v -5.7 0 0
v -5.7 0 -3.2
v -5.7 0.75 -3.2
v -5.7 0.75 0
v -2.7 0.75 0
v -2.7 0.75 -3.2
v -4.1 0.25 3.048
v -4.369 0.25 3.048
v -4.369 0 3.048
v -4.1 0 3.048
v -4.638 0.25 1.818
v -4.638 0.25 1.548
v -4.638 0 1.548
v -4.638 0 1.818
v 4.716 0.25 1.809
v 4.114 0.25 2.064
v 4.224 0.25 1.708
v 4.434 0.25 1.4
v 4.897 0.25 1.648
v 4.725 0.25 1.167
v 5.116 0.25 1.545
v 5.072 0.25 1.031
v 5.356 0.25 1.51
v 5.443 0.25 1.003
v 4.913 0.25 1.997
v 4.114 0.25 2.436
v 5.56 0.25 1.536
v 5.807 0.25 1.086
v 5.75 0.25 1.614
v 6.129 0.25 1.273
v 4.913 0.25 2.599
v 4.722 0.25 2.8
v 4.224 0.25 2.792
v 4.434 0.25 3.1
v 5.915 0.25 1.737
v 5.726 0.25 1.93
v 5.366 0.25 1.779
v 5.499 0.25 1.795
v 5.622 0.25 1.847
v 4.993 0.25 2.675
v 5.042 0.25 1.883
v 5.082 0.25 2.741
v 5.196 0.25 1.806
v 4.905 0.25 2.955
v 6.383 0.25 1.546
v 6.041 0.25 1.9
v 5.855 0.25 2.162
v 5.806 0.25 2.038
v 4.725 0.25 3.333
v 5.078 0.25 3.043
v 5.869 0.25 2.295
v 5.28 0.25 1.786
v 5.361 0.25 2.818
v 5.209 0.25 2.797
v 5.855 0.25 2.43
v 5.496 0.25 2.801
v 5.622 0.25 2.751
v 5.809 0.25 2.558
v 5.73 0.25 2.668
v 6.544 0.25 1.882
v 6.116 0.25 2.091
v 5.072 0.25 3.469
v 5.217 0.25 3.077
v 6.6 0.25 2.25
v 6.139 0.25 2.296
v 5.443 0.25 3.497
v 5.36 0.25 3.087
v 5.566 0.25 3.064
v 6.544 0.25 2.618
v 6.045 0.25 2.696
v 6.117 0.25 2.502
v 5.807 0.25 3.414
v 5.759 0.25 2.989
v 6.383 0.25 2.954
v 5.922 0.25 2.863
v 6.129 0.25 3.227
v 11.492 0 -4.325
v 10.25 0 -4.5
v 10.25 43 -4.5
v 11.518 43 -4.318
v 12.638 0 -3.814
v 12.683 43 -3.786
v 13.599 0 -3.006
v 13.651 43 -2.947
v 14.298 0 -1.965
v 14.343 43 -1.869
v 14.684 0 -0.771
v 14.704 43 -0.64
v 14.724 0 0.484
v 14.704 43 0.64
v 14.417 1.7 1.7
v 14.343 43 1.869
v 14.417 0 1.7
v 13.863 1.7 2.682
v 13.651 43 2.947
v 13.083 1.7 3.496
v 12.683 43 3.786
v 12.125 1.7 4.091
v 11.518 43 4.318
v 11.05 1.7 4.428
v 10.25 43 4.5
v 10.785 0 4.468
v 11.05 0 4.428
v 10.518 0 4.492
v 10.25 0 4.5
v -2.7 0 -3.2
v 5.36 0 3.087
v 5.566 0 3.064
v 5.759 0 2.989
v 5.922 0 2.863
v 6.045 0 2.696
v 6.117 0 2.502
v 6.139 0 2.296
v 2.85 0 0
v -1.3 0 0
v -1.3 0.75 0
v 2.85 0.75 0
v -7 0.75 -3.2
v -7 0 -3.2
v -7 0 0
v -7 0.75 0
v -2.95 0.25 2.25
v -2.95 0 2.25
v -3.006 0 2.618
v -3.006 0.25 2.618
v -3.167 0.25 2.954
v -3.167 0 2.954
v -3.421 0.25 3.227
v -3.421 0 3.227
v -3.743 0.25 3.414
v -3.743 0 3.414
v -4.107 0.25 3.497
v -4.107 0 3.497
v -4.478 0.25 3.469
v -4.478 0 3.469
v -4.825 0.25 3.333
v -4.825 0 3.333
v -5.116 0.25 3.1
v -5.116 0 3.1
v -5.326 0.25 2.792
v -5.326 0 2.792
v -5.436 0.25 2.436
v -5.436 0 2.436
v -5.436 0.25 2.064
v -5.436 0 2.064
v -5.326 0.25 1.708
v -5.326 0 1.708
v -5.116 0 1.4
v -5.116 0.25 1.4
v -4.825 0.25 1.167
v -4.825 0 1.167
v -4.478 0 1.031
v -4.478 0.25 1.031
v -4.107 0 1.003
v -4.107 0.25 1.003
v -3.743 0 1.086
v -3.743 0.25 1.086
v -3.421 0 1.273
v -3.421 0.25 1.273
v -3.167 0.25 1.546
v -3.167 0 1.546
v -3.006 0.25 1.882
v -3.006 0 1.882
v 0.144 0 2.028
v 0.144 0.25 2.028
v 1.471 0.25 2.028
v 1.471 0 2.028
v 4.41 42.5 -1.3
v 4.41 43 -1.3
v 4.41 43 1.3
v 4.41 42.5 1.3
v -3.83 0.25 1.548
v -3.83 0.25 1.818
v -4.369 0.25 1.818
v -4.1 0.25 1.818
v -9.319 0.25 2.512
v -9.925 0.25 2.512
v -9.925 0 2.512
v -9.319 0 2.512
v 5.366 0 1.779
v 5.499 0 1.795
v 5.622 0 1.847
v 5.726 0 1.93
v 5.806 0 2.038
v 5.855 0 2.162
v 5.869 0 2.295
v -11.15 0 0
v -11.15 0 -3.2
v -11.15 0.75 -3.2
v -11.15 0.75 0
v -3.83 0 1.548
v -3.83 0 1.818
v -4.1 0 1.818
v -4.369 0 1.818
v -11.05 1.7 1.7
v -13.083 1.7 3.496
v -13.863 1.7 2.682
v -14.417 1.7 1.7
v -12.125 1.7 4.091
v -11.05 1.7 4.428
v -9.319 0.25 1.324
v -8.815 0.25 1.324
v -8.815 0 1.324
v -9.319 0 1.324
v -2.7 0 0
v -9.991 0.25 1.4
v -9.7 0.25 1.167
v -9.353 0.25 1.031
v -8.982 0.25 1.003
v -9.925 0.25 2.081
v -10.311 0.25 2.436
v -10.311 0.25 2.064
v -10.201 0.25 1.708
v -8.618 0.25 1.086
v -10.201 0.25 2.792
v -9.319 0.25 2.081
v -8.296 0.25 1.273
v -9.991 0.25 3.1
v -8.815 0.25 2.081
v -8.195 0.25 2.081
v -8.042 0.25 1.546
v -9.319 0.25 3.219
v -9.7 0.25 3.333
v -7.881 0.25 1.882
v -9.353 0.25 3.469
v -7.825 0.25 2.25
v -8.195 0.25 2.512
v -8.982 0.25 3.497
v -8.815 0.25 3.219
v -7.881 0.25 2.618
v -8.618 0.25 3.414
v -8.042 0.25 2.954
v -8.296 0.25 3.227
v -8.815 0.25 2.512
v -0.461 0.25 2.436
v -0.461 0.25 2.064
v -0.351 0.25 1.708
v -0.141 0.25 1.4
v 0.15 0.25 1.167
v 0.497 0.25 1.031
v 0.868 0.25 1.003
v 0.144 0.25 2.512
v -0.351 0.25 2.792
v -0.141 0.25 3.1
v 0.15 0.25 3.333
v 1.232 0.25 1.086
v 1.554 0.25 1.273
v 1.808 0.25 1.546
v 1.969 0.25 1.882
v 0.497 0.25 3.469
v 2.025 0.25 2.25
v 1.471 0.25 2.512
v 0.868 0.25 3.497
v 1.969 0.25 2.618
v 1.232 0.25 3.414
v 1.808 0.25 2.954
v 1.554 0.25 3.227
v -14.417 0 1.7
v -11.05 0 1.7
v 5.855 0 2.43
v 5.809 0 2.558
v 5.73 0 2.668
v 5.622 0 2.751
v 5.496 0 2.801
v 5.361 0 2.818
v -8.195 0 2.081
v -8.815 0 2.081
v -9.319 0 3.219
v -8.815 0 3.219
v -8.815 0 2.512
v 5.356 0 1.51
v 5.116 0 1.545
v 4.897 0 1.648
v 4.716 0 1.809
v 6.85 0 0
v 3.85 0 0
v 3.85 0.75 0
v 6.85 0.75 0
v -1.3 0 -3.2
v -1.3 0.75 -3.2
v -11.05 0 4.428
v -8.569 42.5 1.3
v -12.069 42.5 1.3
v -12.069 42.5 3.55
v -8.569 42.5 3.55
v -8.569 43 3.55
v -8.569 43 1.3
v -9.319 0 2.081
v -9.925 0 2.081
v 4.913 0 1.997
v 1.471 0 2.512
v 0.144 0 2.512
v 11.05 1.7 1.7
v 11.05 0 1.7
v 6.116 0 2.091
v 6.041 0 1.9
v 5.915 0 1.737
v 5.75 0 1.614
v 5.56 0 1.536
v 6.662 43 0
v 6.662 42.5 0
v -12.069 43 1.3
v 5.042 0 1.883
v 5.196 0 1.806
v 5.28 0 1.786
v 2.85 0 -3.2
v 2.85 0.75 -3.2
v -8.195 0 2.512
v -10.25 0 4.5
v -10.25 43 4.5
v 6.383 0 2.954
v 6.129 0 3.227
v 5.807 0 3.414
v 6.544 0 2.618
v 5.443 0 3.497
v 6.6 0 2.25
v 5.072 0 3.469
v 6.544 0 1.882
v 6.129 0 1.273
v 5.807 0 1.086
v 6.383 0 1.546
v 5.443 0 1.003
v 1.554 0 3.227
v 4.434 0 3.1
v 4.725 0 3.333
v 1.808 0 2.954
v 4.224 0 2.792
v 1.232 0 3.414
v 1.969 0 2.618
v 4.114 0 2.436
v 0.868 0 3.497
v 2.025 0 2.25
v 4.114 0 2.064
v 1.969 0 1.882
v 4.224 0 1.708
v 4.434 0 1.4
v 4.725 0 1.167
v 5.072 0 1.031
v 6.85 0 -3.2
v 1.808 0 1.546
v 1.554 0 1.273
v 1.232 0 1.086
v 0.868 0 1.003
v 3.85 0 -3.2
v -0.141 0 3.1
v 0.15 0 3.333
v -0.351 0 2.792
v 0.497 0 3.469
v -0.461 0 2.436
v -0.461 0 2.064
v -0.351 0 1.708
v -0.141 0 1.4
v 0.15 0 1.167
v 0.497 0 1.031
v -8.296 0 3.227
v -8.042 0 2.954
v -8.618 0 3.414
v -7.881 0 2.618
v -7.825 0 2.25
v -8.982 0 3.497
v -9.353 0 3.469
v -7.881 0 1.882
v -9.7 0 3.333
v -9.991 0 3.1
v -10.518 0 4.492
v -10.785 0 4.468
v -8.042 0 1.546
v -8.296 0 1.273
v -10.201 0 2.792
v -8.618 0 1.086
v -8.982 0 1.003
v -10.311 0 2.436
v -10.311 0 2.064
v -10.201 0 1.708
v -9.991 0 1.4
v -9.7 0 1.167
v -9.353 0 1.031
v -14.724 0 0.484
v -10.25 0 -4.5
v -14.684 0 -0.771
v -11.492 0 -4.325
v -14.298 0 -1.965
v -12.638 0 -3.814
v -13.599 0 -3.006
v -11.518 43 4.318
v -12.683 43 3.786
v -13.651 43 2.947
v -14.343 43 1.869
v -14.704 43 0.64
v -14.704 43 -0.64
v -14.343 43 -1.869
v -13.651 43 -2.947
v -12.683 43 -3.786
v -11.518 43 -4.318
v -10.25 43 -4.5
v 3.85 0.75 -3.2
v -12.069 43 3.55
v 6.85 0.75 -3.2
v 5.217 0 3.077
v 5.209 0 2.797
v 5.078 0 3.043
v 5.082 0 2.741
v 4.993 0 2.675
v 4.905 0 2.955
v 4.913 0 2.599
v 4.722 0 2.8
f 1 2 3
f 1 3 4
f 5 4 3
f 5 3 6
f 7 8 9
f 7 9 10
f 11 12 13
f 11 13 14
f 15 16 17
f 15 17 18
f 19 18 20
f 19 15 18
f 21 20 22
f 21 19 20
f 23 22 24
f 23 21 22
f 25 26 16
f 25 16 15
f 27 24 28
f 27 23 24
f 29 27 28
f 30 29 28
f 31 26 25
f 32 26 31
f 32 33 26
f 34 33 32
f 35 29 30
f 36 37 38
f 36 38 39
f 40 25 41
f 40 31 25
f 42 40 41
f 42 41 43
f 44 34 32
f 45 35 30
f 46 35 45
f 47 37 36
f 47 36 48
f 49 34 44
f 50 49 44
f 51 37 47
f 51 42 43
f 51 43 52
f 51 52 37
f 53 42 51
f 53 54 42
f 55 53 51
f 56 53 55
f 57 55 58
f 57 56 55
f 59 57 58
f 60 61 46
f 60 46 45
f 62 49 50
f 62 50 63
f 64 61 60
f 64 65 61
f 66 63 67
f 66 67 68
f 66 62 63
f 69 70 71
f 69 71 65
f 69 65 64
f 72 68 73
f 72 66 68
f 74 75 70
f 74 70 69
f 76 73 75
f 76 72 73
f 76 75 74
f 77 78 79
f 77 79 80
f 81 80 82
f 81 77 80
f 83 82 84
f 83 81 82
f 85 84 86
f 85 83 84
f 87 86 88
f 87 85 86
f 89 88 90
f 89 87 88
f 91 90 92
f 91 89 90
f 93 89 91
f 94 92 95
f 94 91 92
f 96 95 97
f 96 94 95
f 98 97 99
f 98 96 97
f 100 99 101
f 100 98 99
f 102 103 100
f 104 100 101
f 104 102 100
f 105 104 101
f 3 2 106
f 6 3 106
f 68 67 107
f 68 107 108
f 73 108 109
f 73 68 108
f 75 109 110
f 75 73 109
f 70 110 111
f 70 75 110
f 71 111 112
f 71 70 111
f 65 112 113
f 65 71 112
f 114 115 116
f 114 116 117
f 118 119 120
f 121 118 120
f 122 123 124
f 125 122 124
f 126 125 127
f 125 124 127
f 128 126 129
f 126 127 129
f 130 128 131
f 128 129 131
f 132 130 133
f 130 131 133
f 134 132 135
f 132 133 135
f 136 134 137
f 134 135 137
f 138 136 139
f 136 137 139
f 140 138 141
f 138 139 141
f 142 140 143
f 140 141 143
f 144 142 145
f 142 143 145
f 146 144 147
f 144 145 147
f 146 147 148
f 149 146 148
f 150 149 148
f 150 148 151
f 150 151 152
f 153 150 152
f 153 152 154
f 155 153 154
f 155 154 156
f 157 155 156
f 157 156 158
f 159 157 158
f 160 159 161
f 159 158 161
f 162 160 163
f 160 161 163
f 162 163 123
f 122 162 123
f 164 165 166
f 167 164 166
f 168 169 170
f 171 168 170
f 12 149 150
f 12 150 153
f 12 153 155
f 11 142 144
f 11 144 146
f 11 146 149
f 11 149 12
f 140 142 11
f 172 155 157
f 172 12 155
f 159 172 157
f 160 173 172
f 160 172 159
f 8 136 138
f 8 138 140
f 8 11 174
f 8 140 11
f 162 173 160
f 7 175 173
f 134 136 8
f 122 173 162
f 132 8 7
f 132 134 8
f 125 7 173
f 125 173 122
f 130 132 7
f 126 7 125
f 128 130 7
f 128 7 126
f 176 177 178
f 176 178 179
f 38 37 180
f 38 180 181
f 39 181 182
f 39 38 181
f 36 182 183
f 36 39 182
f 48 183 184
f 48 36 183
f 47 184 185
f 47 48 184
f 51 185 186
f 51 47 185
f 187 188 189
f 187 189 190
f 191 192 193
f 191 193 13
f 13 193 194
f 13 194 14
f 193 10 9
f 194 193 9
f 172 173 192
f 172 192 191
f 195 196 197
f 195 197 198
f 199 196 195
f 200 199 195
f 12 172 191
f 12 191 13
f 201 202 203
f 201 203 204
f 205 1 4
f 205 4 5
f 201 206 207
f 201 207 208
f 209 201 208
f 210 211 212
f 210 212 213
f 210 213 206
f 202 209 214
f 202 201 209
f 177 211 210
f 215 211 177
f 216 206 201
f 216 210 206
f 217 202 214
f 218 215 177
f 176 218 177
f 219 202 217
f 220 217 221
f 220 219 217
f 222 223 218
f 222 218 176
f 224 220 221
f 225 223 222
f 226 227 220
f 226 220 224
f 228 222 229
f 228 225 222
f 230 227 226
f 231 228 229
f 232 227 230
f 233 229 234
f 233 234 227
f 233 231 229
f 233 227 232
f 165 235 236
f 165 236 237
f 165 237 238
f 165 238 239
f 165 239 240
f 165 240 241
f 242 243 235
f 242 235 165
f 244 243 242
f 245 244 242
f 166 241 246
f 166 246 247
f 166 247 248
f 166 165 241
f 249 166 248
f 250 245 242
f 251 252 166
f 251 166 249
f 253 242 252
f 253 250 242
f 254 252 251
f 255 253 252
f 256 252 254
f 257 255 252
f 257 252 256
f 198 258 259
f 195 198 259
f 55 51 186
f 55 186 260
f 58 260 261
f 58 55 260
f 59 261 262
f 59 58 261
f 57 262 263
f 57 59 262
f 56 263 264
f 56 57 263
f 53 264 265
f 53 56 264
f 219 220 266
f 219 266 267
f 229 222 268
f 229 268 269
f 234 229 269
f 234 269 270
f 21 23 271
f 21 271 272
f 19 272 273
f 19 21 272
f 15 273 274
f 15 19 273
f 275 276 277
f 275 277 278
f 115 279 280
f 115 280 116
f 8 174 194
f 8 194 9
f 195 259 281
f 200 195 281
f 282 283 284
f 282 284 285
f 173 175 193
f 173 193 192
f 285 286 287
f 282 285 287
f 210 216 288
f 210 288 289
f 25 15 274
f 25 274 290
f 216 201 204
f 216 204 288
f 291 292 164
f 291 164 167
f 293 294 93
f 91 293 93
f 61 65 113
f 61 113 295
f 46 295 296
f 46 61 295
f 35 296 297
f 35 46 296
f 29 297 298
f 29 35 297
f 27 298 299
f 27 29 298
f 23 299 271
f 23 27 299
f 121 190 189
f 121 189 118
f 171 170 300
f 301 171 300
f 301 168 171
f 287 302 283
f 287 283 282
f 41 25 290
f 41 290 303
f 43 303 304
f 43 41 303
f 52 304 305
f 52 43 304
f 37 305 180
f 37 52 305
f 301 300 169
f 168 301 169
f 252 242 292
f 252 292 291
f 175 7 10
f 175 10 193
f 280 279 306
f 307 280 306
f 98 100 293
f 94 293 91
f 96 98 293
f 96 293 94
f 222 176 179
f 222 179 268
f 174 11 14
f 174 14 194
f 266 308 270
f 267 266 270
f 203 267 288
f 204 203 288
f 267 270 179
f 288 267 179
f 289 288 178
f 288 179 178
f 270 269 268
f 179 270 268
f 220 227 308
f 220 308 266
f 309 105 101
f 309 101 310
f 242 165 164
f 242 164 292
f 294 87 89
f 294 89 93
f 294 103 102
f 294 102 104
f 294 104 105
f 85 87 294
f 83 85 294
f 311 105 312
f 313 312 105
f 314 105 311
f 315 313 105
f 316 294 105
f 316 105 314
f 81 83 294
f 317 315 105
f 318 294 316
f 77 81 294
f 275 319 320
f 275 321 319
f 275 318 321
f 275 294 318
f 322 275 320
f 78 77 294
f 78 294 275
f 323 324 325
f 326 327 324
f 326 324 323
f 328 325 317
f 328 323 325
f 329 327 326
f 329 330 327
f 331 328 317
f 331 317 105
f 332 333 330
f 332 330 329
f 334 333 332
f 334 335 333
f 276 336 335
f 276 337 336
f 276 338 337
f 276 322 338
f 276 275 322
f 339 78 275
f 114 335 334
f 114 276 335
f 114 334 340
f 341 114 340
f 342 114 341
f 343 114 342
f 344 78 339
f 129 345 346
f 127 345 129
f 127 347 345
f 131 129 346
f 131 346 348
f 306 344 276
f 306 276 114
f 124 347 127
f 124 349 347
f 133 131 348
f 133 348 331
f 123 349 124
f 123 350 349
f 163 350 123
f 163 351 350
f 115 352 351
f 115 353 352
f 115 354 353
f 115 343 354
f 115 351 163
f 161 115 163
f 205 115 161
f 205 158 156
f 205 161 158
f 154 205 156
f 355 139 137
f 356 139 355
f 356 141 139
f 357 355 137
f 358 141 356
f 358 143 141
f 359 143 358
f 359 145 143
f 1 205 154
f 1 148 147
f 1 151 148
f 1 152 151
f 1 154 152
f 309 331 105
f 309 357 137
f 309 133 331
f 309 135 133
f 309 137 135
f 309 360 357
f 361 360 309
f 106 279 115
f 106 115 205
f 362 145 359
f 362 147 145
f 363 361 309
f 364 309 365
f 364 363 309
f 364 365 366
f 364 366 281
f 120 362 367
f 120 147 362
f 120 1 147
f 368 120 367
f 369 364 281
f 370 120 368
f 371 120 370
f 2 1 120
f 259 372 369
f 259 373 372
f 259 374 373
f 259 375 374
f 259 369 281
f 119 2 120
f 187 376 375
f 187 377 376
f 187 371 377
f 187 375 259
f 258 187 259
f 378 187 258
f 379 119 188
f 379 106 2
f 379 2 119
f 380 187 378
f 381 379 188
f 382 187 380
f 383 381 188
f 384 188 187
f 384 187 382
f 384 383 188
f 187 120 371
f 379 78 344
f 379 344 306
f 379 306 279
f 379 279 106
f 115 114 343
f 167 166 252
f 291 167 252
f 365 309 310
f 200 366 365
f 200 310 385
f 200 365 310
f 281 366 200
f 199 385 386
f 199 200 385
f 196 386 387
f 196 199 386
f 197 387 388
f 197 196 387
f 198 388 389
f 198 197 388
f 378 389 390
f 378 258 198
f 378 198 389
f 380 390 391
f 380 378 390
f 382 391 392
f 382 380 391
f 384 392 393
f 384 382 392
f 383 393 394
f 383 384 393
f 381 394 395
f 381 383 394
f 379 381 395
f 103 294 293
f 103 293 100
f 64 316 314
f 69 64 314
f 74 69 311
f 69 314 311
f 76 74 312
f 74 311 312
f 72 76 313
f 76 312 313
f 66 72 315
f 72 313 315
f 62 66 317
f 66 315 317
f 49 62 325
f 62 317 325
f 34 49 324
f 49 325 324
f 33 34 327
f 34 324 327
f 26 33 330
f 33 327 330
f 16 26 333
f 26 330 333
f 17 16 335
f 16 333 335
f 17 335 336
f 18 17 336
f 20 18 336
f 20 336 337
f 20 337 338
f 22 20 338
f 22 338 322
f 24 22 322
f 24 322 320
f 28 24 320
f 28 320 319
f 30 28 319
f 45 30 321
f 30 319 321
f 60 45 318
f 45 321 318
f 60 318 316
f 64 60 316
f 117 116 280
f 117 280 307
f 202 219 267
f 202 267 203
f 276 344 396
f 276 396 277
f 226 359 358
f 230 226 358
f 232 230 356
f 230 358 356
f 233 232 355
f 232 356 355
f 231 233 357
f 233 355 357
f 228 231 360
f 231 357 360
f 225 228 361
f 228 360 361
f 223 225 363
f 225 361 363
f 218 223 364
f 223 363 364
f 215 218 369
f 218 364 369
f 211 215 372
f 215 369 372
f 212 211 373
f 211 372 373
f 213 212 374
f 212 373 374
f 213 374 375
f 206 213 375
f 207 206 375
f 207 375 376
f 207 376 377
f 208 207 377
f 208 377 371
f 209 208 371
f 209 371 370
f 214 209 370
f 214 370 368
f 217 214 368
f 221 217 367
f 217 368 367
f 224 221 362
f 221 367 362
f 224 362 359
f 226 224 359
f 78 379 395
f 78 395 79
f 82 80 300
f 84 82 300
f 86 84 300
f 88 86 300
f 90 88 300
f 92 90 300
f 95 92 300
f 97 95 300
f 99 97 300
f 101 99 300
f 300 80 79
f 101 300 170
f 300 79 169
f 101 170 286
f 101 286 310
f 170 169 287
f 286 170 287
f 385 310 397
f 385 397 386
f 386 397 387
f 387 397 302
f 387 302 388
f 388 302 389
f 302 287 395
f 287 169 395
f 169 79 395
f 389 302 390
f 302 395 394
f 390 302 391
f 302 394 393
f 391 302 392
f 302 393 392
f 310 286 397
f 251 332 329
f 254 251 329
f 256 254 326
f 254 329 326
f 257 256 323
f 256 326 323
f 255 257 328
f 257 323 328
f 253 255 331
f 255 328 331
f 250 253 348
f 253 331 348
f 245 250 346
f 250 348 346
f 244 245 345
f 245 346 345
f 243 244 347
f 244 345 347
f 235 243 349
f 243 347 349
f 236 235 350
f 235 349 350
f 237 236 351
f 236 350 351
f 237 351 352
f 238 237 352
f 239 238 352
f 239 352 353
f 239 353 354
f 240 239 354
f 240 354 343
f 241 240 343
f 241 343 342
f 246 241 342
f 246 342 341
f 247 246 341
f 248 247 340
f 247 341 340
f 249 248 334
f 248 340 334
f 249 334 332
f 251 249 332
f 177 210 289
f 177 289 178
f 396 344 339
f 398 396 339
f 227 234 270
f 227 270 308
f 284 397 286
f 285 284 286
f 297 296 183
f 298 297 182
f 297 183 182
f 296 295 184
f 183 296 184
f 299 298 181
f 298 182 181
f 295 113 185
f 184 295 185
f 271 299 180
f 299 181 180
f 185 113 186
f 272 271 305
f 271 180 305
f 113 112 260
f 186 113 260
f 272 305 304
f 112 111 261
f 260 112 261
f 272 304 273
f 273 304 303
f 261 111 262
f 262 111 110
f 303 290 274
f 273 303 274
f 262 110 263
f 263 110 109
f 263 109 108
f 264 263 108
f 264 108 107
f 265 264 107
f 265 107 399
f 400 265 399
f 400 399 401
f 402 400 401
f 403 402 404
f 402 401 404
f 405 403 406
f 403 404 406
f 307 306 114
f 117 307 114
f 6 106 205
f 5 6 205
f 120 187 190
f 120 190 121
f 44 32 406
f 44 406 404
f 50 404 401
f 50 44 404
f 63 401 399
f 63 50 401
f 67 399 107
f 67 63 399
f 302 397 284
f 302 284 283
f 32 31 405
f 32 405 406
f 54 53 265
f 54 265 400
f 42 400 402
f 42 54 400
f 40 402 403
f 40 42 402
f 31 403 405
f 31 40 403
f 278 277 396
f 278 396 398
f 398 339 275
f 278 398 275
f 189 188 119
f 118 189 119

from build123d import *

# Parameters (mm, degrees)
BOSS_EXTRUDE1_DEPTH = 43
SKETCH2_W           = 3.5
SKETCH2_H           = 2.25
CUT_EXTRUDE1_DEPTH  = 0.5
SKETCH3_W           = 4.15
SKETCH3_H           = 3.2
SKETCH3_W_2         = 3
CUT_EXTRUDE2_DEPTH  = 0.75
SKETCH5_R           = 1.25
CUT_EXTRUDE3_DEPTH  = 0.25
SKETCH6_W           = 1.326960347
SKETCH6_H           = 0.484850896
BOSS_EXTRUDE2_DEPTH = 0.25
SKETCH7_W           = 3.7
SKETCH7_H           = 2.8
CUT_EXTRUDE4_DEPTH  = 1.7


with BuildPart() as part:
    # Sketch1 → Boss-Extrude1 (new body)
    with BuildSketch(Plane(origin=(0, 0, 0), x_dir=(1, 0, 0), z_dir=(0, 1, 0))):
        with BuildLine():
            Line((-10.25, 4.5), (10.25, 4.5))
            ThreePointArc((10.25, 4.5), (14.75, 0), (10.25, -4.5))
            Line((10.25, -4.5), (-10.25, -4.5))
            ThreePointArc((-10.25, -4.5), (-14.75, 0), (-10.25, 4.5))
        make_face()
    extrude(amount=BOSS_EXTRUDE1_DEPTH)

    # Sketch2 → Cut-Extrude1 (cut)
    with BuildSketch(Plane(origin=(0, 43, 0), x_dir=(1, 0, 0), z_dir=(0, 1, 0))):
        with Locations((-10.319273123, -2.424555182)):
            Rectangle(SKETCH2_W, SKETCH2_H)
        Polygon((6.661858634, 0), (4.410192585, 1.3), (4.410192585, -1.3), align=None)
    extrude(amount=-CUT_EXTRUDE1_DEPTH, mode=Mode.SUBTRACT)

    # Sketch3 → Cut-Extrude2 (cut)
    with BuildSketch(Plane.XZ):
        with Locations((-9.075, -1.6)):
            Rectangle(SKETCH3_W, SKETCH3_H)
        with Locations((-4.2, -1.6)):
            Rectangle(SKETCH3_W_2, SKETCH3_H)
        with Locations((0.775, -1.6)):
            Rectangle(SKETCH3_W, SKETCH3_H)
        with Locations((5.35, -1.6)):
            Rectangle(SKETCH3_W_2, SKETCH3_H)
    extrude(amount=-CUT_EXTRUDE2_DEPTH, mode=Mode.SUBTRACT)

    # Sketch5 → Cut-Extrude3 (cut)
    with BuildSketch(Plane.XZ):
        with Locations((-9.075, 2.25)):
            Circle(SKETCH5_R)
        with Locations((-4.2, 2.25)):
            Circle(SKETCH5_R)
        with Locations((0.775, 2.25)):
            Circle(SKETCH5_R)
        with Locations((5.35, 2.25)):
            Circle(SKETCH5_R)
    extrude(amount=-CUT_EXTRUDE3_DEPTH, mode=Mode.SUBTRACT)

    # Sketch6 → Boss-Extrude2 (add)
    with BuildSketch(Plane.XZ.offset(-0.25)):
        Polygon((-9.319136071, 2.080501294), (-9.924638911, 2.080501294), (-9.924638911, 2.512434892), (-9.319136071, 2.512434892), (-9.319136071, 3.219423302), (-8.814550371, 3.219423302), (-8.814550371, 2.512434892), (-8.194630797, 2.512434892), (-8.194630797, 2.080501294), (-8.814550371, 2.080501294), (-8.814550371, 1.323622745), (-9.319136071, 1.323622745), align=None)
        with Locations((0.807600037, 2.270009444)):
            Rectangle(SKETCH6_W, SKETCH6_H)
        with BuildLine():
            Line((4.715564351, 1.80853907), (4.912980216, 1.997240994))
            add(Edge.make_bspline(
                [(4.912980216, 1.997240994), (4.929707146, 1.979899926), (4.962433267, 1.945972249), (5.015418116, 1.901557226), (5.069888716, 1.863810031), (5.125997527, 1.833043383), (5.183712319, 1.808626724), (5.243133504, 1.791593673), (5.30411755, 1.780868656), (5.345327837, 1.77968748), (5.366105216, 1.779091955)],
                knots=[0, 0, 0, 0, 7.224e-05, 0.000141338, 0.000207016, 0.000270758, 0.000332981, 0.000394603, 0.000455858, 0.000518145, 0.000518145, 0.000518145, 0.000518145], degree=3))
            add(Edge.make_bspline(
                [(5.366105216, 1.779091955), (5.383454547, 1.779571665), (5.417691539, 1.78051832), (5.467955666, 1.787474955), (5.516054131, 1.799260394), (5.562025094, 1.815642069), (5.60609584, 1.836272091), (5.647855993, 1.862202541), (5.687529977, 1.892567959), (5.724654232, 1.927315209), (5.758169405, 1.965560051), (5.788367052, 2.005838724), (5.813379552, 2.048863663), (5.833797229, 2.09400743), (5.849886827, 2.141286329), (5.86130626, 2.190697991), (5.867922688, 2.24235398), (5.868909154, 2.277470612), (5.869410505, 2.295317917)],
                knots=[0, 0, 0, 0, 5.2039e-05, 0.000102693, 0.000151885, 0.000200355, 0.000248878, 0.000297579, 0.000347521, 0.000398543, 0.000449848, 0.000499909, 0.000549331, 0.000598819, 0.000648325, 0.000698909, 0.000750715, 0.000804255, 0.000804255, 0.000804255, 0.000804255], degree=3))
            add(Edge.make_bspline(
                [(5.869410505, 2.295317917), (5.869263959, 2.307844037), (5.868975113, 2.332533276), (5.86589296, 2.368961679), (5.860774249, 2.404382271), (5.853594852, 2.438690106), (5.844556603, 2.472033181), (5.833494646, 2.504194313), (5.820119677, 2.535214768), (5.805150865, 2.565257037), (5.788442474, 2.594066561), (5.769713133, 2.621261294), (5.74917272, 2.646629922), (5.727643129, 2.671055186), (5.703698503, 2.693107682), (5.678410927, 2.714002754), (5.651417573, 2.733222757), (5.622751223, 2.750500219), (5.593267533, 2.766602513), (5.562362337, 2.779937286), (5.530899248, 2.791924454), (5.498326297, 2.800942411), (5.465217256, 2.808786127), (5.431111276, 2.813576528), (5.396332037, 2.8172166), (5.372826074, 2.817440712), (5.360997043, 2.817553494)],
                knots=[0, 0, 0, 0, 3.7571e-05, 7.4053e-05, 0.000109578, 0.000144878, 0.000179138, 0.000213158, 0.000246813, 0.000280408, 0.000313803, 0.000346642, 0.00037935, 0.000411691, 0.000444216, 0.00047688, 0.000510064, 0.000543509, 0.000577252, 0.000610751, 0.000644407, 0.00067817, 0.000712066, 0.000746402, 0.000781414, 0.000816882, 0.000816882, 0.000816882, 0.000816882], degree=3))
            add(Edge.make_bspline(
                [(5.360997043, 2.817553494), (5.340932624, 2.81697445), (5.301511258, 2.81583678), (5.24366326, 2.806901525), (5.188381183, 2.792269684), (5.144297695, 2.774670447), (5.109804461, 2.757561474), (5.083558758, 2.7419627), (5.056533291, 2.724293685), (5.028913098, 2.70406497), (5.000548666, 2.681517285), (4.971927273, 2.656179356), (4.94232014, 2.628879026), (4.922924645, 2.609394521), (4.912980216, 2.599404455)],
                knots=[0, 0, 0, 0, 6.0171e-05, 0.000118221, 0.000175146, 0.00023139, 0.000260282, 0.000290584, 0.000322921, 0.000357119, 0.000393253, 0.000431582, 0.000471767, 0.00051405, 0.00051405, 0.00051405, 0.00051405], degree=3))
            Line((4.912980216, 2.599404455), (4.721573966, 2.80042609))
            add(Edge.make_bspline(
                [(4.721573966, 2.80042609), (4.735028795, 2.813416305), (4.761289744, 2.838770428), (4.800903659, 2.874770908), (4.840467708, 2.907121373), (4.879026152, 2.936995856), (4.917210456, 2.963524548), (4.955017137, 2.98673217), (4.992016231, 3.00721189), (5.028982989, 3.024596757), (5.066210855, 3.039452525), (5.104498273, 3.051981146), (5.143863537, 3.062917773), (5.184632673, 3.071524335), (5.226623771, 3.078530672), (5.269971765, 3.083160305), (5.314474118, 3.086370664), (5.344564827, 3.086645271), (5.35979512, 3.086784263)],
                knots=[0, 0, 0, 0, 5.6107e-05, 0.000109509, 0.000160524, 0.000209386, 0.000255813, 0.000299927, 0.000342421, 0.000382612, 0.000422396, 0.000462589, 0.000503412, 0.000544902, 0.000587533, 0.000631069, 0.000675641, 0.000721323, 0.000721323, 0.000721323, 0.000721323], degree=3))
            add(Edge.make_bspline(
                [(5.35979512, 3.086784263), (5.387770205, 3.086069862), (5.44250967, 3.084671977), (5.522736662, 3.074350257), (5.599013379, 3.056931828), (5.671476881, 3.03263203), (5.739905397, 3.001078873), (5.804513521, 2.962792741), (5.865193661, 2.917410259), (5.921423669, 2.865607584), (5.972270451, 2.808383842), (6.017263923, 2.746964786), (6.05431883, 2.680909351), (6.085758013, 2.611632486), (6.109316906, 2.538051127), (6.126465703, 2.460830166), (6.136900657, 2.379638221), (6.138053378, 2.324195186), (6.138641274, 2.295918878)],
                knots=[0, 0, 0, 0, 8.3912e-05, 0.000164192, 0.000242185, 0.000318297, 0.000393051, 0.000467825, 0.000543186, 0.000619954, 0.000696787, 0.000772517, 0.000847877, 0.000923602, 0.00100038, 0.001079187, 0.001160659, 0.001245459, 0.001245459, 0.001245459, 0.001245459], degree=3))
            add(Edge.make_bspline(
                [(6.138641274, 2.295918878), (6.138384513, 2.277478096), (6.137875675, 2.240932973), (6.132859378, 2.186959442), (6.12516416, 2.134563275), (6.114212057, 2.083808916), (6.100594572, 2.034520629), (6.083261482, 1.986921578), (6.063185313, 1.940751187), (6.039746603, 1.896439727), (6.013473059, 1.853931201), (5.984748971, 1.813333056), (5.953021206, 1.775049105), (5.918591266, 1.738911903), (5.881745297, 1.704687885), (5.842122948, 1.672619943), (5.799686332, 1.642914873), (5.754868318, 1.615548264), (5.708522141, 1.590415811), (5.660614863, 1.569342312), (5.612080106, 1.550739522), (5.56258902, 1.535713643), (5.512032672, 1.524379585), (5.460797123, 1.51582654), (5.408463744, 1.51103959), (5.373325792, 1.51025649), (5.355588389, 1.509861186)],
                knots=[0, 0, 0, 0, 5.5309e-05, 0.000109609, 0.000162473, 0.0002141, 0.00026528, 0.000315751, 0.000365939, 0.000416209, 0.000465993, 0.000515768, 0.000565283, 0.000615018, 0.00066541, 0.000716045, 0.000767813, 0.000820688, 0.000873519, 0.000925843, 0.000977576, 0.001029382, 0.001080845, 0.001132911, 0.001185116, 0.001238332, 0.001238332, 0.001238332, 0.001238332], degree=3))
            add(Edge.make_bspline(
                [(5.355588389, 1.509861186), (5.340456681, 1.510088069), (5.310350592, 1.510539475), (5.265516337, 1.514295789), (5.221045554, 1.52021179), (5.177074042, 1.529075404), (5.133404064, 1.539809648), (5.090218454, 1.553031339), (5.047636298, 1.569158702), (5.005288443, 1.58699897), (4.964019452, 1.607309189), (4.924187982, 1.630042499), (4.885695338, 1.654604176), (4.848773565, 1.681416683), (4.813162609, 1.71008618), (4.778900466, 1.740611719), (4.746315906, 1.773547024), (4.72586669, 1.796816088), (4.715564351, 1.80853907)],
                knots=[0, 0, 0, 0, 4.5389e-05, 9.0305e-05, 0.000134883, 0.000179905, 0.000224797, 0.000269754, 0.000315297, 0.000361342, 0.000407569, 0.000453187, 0.000498865, 0.000544484, 0.000590004, 0.000635969, 0.000682075, 0.000728889, 0.000728889, 0.000728889, 0.000728889], degree=3))
        make_face()
        Polygon((-3.830473477, 1.548322724), (-4.638165785, 1.548322724), (-4.638165785, 1.817553494), (-4.368935016, 1.817553494), (-4.368935016, 3.048322724), (-4.099704247, 3.048322724), (-4.099704247, 1.817553494), (-3.830473477, 1.817553494), align=None)
    extrude(amount=BOSS_EXTRUDE2_DEPTH)

    # Sketch7 → Cut-Extrude4 (cut)
    with BuildSketch(Plane.XZ):
        with Locations((-12.9, 3.1)):
            Rectangle(SKETCH7_W, SKETCH7_H)
        with Locations((12.9, 3.1)):
            Rectangle(SKETCH7_W, SKETCH7_H)
    extrude(amount=-CUT_EXTRUDE4_DEPTH, mode=Mode.SUBTRACT)


solid = part.part
